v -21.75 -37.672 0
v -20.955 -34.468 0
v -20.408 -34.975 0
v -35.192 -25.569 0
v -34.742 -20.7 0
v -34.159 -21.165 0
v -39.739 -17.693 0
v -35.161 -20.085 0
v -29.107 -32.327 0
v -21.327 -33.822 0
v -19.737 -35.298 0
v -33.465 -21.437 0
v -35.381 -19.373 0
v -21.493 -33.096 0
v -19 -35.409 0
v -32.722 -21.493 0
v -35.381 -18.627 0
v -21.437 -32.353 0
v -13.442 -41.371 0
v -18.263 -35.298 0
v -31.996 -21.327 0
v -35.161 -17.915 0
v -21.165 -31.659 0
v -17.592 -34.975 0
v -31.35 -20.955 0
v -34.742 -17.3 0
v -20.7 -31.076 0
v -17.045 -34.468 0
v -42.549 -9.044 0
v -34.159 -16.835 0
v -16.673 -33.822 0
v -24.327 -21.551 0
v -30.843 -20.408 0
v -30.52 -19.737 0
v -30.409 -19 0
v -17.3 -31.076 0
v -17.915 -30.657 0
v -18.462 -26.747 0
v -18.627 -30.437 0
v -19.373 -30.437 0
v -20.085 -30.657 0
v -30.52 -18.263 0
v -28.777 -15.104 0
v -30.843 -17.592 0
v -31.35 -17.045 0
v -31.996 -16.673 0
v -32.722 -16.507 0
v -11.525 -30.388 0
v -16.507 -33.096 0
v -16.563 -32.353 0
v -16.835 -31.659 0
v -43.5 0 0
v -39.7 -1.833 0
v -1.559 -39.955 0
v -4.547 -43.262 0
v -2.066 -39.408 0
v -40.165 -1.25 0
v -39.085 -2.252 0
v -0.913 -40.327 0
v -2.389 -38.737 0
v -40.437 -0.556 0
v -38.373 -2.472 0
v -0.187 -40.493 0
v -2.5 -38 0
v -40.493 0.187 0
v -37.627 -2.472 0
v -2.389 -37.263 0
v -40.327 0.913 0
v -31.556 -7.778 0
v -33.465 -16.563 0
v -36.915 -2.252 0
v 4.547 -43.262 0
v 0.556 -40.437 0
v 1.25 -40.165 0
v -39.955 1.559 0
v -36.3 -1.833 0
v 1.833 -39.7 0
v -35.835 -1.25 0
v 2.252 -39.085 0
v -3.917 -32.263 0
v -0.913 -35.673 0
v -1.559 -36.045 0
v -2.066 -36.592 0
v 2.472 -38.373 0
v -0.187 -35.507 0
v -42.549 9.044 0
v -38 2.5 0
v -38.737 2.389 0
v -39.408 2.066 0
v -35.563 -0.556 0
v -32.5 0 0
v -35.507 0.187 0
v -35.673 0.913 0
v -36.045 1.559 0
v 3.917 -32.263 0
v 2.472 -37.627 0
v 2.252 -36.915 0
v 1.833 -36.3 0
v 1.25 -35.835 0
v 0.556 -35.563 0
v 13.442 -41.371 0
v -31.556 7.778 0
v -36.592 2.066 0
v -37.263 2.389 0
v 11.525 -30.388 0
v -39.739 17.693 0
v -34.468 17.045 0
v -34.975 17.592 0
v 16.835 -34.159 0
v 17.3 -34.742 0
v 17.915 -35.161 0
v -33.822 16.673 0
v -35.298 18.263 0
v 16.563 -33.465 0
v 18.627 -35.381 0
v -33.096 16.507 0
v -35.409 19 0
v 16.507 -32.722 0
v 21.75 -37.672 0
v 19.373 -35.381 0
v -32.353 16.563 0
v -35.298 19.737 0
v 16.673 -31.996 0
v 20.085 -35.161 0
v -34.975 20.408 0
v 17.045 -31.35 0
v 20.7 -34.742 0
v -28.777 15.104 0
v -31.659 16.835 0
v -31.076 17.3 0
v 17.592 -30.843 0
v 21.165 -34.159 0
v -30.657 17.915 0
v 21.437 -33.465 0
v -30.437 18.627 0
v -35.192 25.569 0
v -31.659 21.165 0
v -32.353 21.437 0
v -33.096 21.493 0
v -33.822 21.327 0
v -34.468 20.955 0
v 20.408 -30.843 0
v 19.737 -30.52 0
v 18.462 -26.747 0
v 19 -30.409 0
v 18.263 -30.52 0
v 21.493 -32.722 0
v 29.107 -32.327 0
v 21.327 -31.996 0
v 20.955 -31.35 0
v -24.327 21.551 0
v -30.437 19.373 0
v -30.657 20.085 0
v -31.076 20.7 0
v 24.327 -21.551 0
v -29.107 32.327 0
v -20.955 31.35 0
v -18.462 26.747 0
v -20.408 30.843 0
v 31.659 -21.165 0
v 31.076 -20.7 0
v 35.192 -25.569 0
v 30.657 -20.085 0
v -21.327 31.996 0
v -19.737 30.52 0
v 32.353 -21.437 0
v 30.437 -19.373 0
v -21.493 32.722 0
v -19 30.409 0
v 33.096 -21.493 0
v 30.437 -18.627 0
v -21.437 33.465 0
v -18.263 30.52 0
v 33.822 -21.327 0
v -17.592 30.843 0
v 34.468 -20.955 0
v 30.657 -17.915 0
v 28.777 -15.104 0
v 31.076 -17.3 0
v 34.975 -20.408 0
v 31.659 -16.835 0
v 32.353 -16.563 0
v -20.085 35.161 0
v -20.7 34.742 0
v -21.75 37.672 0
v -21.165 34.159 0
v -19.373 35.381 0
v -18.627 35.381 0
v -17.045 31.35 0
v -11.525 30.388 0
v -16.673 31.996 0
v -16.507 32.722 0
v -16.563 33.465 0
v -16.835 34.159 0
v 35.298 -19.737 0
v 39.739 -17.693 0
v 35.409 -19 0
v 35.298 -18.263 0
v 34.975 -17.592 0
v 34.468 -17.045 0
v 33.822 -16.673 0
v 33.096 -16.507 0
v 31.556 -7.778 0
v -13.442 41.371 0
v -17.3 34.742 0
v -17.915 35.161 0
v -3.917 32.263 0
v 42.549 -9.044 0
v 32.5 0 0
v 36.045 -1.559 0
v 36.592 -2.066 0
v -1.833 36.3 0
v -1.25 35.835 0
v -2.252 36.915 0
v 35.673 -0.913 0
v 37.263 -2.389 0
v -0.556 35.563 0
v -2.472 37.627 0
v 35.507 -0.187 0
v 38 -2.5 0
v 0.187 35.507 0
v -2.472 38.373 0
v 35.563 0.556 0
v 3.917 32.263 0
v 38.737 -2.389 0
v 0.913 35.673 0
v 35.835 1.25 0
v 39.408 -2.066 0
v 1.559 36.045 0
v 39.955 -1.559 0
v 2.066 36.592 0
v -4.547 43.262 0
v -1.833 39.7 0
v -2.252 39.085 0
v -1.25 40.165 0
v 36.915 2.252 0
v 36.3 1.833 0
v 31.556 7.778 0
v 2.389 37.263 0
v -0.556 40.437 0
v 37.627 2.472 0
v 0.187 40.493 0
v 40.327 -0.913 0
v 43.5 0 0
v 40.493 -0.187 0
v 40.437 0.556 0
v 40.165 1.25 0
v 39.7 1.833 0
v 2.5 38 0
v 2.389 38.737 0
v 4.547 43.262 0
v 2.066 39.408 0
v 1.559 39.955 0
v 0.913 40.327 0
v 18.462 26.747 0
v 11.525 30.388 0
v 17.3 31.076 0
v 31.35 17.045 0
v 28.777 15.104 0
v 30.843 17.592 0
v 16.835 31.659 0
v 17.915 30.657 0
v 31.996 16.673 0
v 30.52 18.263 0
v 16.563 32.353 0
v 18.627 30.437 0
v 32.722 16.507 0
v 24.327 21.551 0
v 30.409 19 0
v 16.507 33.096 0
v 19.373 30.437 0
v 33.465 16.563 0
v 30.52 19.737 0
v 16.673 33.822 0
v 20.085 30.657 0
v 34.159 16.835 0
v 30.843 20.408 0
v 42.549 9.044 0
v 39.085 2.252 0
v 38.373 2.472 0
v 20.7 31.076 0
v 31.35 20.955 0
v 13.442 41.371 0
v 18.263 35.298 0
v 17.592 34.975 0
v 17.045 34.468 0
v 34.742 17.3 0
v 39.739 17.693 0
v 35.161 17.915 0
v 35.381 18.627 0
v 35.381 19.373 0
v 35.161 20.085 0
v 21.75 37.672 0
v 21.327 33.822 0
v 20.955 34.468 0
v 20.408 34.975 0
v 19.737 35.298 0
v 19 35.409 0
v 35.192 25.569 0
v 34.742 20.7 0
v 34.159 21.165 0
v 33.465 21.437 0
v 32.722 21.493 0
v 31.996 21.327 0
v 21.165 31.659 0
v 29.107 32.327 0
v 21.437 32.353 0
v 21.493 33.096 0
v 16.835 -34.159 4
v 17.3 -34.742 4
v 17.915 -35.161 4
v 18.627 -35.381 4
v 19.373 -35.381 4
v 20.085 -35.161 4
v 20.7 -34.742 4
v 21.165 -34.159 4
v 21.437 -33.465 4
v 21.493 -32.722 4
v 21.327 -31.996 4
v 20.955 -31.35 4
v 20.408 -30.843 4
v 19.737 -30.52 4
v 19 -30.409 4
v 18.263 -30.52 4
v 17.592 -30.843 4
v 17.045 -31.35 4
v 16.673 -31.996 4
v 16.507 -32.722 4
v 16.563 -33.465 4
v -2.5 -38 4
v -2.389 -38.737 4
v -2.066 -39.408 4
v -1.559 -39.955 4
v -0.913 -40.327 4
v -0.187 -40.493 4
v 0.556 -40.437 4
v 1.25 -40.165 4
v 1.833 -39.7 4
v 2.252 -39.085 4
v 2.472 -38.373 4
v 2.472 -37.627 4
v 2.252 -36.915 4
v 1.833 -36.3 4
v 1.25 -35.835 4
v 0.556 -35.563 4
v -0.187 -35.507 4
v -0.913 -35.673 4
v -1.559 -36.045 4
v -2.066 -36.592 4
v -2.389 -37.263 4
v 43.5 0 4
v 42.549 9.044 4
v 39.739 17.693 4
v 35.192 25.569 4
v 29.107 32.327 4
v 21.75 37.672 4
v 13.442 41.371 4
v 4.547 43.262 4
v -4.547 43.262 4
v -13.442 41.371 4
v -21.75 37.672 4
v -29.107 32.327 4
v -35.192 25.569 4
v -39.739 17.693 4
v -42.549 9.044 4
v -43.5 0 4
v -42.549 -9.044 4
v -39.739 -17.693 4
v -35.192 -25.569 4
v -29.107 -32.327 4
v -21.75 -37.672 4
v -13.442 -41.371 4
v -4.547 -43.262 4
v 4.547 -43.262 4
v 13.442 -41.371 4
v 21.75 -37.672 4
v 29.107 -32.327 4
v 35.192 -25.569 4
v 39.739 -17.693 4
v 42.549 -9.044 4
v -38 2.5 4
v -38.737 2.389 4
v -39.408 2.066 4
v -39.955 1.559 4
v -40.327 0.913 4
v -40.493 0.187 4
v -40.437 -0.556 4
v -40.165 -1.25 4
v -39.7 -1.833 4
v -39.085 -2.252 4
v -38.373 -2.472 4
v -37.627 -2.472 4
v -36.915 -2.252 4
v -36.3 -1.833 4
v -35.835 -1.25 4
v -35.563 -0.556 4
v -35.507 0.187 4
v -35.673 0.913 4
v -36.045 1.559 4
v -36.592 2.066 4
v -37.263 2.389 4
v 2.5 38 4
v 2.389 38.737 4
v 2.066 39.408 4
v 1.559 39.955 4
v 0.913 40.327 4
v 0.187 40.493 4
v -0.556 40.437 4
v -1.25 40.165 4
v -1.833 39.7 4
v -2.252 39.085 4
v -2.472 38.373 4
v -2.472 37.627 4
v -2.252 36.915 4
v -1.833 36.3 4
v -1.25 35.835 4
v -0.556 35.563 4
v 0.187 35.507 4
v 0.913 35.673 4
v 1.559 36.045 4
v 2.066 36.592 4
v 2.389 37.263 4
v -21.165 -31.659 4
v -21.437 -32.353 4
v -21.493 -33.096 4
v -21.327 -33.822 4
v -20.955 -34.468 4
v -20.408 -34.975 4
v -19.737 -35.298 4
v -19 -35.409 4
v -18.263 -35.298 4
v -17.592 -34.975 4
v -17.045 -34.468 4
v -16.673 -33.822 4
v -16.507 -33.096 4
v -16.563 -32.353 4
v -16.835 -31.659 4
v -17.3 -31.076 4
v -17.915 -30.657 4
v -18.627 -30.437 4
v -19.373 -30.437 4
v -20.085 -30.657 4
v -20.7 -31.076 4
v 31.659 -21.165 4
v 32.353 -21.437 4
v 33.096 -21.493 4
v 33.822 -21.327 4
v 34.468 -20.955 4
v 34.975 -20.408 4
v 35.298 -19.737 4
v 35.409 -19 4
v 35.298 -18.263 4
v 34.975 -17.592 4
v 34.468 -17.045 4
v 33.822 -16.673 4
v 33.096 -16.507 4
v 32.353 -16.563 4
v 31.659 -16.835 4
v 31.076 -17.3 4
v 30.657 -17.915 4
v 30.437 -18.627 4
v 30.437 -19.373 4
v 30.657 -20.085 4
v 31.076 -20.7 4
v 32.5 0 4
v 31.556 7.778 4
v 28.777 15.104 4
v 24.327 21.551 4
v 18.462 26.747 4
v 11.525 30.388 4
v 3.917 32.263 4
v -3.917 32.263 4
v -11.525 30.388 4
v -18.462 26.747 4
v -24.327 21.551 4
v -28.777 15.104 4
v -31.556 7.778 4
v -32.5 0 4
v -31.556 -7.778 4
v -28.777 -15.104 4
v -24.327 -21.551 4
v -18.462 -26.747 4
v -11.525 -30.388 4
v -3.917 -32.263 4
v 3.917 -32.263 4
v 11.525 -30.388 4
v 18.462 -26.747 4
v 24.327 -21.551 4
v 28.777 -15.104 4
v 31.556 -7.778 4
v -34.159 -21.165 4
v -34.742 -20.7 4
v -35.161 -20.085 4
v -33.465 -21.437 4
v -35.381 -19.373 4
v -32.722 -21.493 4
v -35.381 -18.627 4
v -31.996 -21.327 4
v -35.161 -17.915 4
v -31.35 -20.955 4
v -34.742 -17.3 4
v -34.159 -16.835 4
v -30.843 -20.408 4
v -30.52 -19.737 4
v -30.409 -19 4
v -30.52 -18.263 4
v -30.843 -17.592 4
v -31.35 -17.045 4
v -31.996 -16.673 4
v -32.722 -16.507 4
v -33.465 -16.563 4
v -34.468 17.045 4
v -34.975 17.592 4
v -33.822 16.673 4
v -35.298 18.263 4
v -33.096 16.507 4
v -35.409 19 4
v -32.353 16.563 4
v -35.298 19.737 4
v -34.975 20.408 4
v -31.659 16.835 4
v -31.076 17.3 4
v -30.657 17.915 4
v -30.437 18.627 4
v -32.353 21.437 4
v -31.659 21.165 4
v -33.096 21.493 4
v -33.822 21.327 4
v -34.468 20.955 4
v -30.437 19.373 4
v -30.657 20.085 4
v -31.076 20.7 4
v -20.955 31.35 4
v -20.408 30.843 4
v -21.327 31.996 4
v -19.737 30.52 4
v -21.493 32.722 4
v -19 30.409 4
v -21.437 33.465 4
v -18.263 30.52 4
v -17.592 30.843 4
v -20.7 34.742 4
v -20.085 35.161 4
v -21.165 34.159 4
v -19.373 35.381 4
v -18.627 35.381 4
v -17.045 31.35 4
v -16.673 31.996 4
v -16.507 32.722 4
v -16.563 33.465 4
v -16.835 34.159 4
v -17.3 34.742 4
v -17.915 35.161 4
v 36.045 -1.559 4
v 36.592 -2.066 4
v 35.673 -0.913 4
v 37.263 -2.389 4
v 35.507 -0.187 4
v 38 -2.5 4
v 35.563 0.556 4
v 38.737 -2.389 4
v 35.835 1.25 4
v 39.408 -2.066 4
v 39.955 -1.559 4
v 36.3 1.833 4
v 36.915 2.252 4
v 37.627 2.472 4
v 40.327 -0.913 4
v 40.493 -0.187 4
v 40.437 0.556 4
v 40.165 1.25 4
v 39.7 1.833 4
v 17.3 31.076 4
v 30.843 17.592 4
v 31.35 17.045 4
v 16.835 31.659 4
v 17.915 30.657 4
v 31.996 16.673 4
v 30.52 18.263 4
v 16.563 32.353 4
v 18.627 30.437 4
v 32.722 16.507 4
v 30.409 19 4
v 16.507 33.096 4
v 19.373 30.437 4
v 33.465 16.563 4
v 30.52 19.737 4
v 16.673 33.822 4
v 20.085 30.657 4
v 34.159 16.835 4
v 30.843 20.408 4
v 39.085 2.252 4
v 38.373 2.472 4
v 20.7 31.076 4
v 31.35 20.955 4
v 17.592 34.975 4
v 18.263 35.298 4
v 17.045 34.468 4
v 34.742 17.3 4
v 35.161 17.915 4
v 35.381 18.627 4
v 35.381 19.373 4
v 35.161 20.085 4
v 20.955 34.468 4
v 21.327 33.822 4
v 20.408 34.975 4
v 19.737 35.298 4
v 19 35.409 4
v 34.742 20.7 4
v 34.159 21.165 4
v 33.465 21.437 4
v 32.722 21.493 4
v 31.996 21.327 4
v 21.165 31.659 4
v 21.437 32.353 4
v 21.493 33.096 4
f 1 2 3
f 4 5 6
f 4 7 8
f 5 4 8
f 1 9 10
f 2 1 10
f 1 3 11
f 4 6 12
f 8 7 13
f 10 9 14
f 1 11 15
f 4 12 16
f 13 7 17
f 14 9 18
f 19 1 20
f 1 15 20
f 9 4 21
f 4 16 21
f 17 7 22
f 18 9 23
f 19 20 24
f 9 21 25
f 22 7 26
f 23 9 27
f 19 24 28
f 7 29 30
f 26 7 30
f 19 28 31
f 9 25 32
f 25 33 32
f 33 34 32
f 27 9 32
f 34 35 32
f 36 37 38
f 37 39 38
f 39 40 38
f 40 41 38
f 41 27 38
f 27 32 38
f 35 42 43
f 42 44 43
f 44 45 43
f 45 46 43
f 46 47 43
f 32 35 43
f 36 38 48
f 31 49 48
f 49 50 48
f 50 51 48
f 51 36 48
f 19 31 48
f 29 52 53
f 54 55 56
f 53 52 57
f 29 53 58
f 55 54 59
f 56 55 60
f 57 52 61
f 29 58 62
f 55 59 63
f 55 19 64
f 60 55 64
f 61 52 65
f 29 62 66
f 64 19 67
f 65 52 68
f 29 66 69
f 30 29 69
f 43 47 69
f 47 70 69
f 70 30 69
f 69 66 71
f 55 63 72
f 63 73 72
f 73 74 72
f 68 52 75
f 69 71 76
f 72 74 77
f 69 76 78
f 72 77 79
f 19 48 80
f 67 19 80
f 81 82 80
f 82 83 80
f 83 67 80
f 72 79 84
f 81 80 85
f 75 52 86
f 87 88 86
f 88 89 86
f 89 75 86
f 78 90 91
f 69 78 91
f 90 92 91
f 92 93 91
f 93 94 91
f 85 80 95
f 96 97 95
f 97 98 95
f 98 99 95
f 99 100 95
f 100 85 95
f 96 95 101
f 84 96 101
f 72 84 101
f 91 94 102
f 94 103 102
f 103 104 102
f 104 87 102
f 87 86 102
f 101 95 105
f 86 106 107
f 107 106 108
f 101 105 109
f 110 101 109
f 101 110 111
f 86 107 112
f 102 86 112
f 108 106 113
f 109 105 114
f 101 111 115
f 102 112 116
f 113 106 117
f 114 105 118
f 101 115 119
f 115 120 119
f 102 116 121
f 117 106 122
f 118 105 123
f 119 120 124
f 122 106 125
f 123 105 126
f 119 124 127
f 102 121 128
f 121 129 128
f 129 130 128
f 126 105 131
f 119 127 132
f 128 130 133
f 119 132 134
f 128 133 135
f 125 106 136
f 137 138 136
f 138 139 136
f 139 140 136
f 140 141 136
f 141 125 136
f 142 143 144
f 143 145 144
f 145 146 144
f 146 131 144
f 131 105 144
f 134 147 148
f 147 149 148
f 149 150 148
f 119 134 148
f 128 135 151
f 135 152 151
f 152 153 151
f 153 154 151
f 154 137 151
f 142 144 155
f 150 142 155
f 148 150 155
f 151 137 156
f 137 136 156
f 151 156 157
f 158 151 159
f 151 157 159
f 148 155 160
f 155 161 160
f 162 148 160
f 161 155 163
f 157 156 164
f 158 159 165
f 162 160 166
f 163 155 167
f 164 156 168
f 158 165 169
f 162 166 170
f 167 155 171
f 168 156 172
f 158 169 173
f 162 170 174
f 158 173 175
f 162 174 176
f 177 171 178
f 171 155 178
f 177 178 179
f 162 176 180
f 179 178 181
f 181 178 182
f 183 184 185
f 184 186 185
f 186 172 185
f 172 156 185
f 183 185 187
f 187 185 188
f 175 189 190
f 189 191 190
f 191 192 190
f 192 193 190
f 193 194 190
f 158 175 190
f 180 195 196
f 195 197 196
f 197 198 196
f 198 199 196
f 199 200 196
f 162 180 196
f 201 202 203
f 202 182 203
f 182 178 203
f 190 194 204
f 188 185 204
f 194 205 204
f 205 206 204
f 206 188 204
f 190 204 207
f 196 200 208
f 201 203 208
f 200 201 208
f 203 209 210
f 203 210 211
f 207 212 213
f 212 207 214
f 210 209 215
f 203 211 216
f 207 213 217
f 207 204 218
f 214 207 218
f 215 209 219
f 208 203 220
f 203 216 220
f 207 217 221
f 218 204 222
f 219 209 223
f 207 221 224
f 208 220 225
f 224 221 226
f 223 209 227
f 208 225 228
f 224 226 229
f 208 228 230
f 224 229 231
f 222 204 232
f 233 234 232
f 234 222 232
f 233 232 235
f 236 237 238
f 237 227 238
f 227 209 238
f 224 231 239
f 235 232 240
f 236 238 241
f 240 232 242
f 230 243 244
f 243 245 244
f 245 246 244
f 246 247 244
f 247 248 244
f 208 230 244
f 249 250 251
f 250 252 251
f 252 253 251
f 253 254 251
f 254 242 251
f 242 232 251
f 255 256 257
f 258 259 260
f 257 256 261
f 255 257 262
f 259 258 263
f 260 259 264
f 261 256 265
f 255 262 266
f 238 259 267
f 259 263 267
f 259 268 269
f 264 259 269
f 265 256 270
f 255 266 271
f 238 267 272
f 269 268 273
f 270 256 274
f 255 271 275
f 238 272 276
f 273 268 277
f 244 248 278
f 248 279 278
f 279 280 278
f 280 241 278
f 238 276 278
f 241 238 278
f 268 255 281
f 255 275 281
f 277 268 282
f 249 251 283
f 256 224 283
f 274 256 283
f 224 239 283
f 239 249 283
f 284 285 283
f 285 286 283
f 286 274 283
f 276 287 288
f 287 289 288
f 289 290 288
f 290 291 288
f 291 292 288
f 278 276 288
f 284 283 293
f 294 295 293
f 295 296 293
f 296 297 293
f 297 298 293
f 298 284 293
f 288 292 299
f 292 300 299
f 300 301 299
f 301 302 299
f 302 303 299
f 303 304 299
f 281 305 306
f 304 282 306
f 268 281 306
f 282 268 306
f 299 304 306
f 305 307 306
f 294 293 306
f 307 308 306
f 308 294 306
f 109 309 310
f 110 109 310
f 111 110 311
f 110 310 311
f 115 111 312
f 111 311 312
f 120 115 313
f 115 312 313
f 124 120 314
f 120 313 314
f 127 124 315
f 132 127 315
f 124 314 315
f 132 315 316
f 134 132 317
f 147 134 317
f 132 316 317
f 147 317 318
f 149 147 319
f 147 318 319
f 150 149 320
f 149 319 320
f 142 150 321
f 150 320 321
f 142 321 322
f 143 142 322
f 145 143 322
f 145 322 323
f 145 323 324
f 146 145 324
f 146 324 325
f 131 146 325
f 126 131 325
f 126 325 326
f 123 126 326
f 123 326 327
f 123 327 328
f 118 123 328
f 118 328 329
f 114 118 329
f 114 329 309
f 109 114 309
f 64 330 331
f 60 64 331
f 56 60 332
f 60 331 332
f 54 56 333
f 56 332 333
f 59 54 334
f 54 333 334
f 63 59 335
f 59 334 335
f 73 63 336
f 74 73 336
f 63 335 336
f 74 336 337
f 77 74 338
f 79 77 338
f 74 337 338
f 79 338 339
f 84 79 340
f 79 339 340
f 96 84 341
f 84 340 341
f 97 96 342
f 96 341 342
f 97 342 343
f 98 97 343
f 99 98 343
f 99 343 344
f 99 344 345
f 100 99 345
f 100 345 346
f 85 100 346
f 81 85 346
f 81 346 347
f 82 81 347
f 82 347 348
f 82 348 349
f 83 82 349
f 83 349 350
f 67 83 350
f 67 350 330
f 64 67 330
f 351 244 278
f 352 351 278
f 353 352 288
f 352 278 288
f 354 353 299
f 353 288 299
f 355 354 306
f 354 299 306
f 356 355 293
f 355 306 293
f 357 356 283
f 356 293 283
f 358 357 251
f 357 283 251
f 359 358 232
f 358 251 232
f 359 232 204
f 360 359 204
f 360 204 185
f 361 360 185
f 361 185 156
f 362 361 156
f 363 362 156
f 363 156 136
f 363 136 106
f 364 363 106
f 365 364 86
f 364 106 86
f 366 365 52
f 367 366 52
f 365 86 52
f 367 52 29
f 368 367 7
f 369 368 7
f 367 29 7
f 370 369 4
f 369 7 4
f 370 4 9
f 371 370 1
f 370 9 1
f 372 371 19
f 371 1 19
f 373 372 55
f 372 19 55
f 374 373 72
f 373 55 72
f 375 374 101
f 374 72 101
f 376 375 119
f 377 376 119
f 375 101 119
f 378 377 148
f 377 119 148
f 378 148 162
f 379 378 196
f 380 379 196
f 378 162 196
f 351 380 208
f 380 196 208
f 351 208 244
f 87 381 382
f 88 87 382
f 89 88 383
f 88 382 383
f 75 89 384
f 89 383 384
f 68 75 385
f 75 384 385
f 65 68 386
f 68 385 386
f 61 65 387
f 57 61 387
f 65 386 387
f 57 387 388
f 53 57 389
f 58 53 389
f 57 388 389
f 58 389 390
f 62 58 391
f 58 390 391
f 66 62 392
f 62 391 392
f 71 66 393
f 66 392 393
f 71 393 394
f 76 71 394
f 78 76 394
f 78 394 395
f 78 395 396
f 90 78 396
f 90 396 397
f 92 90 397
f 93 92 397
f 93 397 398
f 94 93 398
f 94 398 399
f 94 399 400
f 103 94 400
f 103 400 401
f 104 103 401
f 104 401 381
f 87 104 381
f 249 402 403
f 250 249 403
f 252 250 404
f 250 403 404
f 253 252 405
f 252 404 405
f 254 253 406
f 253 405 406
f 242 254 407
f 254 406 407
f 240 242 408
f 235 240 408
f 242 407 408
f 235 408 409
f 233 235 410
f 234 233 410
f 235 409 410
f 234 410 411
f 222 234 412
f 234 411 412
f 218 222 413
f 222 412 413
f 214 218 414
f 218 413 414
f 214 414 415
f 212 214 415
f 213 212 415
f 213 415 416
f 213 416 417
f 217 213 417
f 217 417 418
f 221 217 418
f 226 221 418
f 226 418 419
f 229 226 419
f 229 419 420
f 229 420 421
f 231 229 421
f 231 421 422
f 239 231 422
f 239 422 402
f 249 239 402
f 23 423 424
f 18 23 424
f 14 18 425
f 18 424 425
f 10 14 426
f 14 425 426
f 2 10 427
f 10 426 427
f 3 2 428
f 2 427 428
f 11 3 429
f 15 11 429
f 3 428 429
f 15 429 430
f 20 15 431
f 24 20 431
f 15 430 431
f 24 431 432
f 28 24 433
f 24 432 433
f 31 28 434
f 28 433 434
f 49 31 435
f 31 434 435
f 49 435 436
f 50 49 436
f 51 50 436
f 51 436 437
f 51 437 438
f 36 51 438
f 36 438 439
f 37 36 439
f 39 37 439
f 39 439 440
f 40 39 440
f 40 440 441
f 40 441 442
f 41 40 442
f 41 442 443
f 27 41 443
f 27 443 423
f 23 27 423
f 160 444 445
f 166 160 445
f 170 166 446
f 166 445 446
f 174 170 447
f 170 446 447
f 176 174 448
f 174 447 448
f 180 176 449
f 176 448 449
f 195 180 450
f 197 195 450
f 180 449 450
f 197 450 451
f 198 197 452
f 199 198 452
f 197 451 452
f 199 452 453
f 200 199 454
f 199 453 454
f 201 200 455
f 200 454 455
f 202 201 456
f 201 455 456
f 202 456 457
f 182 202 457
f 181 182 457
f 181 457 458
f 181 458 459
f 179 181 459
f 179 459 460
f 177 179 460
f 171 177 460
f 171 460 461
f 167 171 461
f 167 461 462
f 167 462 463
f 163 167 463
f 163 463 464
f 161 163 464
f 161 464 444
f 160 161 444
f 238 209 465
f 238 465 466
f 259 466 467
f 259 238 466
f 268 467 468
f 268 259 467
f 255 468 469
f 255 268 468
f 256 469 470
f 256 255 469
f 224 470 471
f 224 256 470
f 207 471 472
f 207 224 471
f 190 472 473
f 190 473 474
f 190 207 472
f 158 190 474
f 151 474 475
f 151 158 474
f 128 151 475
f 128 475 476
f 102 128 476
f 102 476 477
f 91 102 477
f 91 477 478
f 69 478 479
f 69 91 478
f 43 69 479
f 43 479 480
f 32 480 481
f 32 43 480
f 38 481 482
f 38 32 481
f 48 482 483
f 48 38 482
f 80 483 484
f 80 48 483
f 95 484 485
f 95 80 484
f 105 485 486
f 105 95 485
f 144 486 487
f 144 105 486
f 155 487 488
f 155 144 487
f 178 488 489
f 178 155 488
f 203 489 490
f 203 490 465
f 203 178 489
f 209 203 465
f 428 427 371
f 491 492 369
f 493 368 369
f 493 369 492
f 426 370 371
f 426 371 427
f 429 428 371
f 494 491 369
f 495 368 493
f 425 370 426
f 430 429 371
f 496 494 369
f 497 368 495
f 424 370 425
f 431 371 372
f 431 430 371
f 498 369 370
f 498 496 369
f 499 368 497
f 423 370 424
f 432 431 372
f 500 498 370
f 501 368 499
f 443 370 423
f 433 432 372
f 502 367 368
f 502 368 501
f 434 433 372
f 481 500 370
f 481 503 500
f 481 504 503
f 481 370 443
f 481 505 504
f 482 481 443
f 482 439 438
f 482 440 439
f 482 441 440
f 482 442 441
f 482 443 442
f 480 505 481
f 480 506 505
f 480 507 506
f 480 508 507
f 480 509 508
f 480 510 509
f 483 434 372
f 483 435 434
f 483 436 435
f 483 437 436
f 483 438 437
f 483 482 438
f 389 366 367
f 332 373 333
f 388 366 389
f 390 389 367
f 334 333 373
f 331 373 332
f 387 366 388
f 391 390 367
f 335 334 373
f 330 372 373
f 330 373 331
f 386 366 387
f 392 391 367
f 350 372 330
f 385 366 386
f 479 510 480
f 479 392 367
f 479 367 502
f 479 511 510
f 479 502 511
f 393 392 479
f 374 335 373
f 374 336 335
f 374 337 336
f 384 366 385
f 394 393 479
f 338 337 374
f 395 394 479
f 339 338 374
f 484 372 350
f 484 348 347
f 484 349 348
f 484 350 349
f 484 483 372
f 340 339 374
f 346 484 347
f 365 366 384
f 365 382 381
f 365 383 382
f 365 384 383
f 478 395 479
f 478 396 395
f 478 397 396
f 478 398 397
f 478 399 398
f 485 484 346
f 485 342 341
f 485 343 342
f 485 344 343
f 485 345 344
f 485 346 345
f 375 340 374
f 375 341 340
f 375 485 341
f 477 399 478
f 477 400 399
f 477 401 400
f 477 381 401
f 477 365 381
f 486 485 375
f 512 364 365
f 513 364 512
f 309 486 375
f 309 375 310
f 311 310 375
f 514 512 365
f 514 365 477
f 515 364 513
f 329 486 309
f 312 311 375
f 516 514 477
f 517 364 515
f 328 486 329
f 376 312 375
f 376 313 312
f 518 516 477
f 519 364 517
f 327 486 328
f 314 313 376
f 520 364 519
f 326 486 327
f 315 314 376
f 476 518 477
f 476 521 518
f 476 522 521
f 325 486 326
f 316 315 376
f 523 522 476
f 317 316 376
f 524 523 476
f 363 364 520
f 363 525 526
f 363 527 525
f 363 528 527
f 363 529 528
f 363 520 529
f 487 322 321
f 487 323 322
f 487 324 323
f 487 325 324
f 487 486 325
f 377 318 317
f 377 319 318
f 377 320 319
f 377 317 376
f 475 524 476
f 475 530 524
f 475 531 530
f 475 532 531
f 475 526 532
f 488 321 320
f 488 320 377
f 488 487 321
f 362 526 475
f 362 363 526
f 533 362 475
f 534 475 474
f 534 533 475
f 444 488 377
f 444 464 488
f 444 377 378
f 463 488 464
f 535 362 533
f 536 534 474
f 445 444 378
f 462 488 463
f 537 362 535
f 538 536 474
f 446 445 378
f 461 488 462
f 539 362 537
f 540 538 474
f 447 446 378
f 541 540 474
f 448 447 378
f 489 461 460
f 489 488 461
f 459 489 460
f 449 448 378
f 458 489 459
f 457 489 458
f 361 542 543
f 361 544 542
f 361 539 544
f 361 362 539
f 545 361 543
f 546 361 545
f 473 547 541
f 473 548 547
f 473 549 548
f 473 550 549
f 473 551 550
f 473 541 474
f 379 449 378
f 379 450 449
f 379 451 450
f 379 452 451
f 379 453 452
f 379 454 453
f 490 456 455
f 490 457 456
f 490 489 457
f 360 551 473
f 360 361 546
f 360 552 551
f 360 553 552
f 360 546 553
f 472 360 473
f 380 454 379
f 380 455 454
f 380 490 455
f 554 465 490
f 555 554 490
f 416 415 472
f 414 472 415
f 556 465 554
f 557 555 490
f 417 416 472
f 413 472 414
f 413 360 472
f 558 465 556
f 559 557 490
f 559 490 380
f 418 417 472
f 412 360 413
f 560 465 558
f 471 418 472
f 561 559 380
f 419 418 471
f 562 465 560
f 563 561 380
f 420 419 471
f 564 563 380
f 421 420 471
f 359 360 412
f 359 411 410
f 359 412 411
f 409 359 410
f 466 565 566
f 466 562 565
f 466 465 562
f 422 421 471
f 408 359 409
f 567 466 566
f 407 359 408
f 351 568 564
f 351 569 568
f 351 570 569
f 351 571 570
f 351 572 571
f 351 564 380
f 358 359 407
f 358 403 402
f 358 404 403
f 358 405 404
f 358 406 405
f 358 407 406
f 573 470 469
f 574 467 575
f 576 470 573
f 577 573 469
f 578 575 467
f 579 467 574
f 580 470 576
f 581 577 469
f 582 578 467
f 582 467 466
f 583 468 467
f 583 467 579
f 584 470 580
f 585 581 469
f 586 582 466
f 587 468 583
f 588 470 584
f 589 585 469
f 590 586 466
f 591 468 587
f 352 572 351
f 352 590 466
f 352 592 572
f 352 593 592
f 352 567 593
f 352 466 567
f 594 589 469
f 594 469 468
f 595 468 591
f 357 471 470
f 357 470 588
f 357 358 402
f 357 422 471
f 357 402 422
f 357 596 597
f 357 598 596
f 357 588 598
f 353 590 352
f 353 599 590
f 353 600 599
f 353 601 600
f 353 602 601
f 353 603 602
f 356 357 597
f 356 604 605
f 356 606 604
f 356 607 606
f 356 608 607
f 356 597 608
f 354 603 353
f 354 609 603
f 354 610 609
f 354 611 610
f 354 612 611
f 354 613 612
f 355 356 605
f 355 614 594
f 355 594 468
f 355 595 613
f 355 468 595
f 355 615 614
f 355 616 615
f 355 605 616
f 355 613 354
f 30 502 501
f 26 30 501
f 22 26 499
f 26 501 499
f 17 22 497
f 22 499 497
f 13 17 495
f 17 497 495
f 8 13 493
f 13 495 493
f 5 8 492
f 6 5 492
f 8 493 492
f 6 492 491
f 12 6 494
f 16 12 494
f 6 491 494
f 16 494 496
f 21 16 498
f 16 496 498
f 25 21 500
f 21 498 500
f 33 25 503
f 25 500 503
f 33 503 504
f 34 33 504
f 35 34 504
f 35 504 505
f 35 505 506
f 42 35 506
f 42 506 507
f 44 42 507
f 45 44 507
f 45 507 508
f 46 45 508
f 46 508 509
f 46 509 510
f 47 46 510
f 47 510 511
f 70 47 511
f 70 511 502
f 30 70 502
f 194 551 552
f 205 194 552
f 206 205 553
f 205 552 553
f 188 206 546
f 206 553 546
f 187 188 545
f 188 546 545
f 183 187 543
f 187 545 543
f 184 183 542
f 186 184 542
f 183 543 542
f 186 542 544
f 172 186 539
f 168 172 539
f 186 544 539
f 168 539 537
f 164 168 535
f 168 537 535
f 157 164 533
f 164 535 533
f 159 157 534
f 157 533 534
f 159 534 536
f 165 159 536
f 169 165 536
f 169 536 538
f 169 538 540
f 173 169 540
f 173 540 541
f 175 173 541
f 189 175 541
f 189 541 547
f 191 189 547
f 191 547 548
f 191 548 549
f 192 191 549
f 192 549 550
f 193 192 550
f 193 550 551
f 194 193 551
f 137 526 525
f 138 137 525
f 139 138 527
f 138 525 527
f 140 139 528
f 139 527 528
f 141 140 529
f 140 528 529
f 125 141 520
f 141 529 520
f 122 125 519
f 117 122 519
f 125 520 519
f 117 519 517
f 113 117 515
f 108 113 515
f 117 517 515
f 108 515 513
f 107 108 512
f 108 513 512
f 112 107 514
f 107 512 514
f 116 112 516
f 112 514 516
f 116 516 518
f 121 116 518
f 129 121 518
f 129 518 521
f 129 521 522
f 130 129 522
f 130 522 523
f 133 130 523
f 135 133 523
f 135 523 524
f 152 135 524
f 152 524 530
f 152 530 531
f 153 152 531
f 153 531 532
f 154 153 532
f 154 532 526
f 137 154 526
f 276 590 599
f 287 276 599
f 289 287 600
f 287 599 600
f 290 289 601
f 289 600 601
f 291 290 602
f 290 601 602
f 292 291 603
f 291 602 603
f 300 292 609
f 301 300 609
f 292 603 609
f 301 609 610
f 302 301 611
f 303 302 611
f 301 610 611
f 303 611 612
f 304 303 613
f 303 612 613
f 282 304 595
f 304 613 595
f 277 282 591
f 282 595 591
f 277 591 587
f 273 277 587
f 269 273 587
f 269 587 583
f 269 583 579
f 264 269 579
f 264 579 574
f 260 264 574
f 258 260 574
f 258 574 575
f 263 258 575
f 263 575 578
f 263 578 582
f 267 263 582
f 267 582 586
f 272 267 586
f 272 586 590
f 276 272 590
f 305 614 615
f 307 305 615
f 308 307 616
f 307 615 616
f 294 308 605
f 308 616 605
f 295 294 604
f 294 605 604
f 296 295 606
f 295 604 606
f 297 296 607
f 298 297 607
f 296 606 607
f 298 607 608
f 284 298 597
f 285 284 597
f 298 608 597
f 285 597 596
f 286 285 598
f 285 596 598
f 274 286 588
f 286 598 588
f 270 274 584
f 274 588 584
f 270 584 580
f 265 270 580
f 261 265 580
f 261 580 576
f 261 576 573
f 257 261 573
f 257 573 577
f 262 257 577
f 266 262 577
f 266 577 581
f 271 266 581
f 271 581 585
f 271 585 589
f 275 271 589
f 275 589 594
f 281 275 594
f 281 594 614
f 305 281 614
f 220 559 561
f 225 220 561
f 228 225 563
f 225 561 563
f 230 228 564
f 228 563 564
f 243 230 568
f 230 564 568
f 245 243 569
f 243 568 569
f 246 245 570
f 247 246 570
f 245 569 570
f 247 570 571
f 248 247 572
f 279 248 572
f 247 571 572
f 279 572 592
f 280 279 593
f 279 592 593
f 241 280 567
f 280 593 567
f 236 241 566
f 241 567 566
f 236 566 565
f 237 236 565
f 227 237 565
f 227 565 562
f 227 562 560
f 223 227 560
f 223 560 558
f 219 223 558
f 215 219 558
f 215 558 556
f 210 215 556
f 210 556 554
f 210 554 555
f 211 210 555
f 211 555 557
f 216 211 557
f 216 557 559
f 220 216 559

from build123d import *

# Parameters (mm, degrees)
SKETCH1_R          = 43.5
SKETCH1_R_2        = 32.5
BODY_DEPTH         = 4
SKETCH2_R          = 2.5
BOLT_HOLE_DEPTH    = 62.648195432
BOLT_PATTERN_COUNT = 12


with BuildPart() as part:
    # Sketch1 → Body (new body)
    with BuildSketch(Plane.XY):
        Circle(SKETCH1_R)
        Circle(SKETCH1_R_2, mode=Mode.SUBTRACT)
    extrude(amount=BODY_DEPTH)

    # Sketch2 → Bolt Hole (cut, through all)
    with BuildSketch(Plane.XY.offset(4)):
        with Locations((0, 38)):
            Circle(SKETCH2_R)
    bolt_hole = extrude(amount=-BOLT_HOLE_DEPTH, mode=Mode.SUBTRACT)

    # Bolt Pattern: Bolt Hole ×12 about axis
    bolt_pattern_axis = Axis((0, 0, 0), (0, 0, 1))
    for i in range(1, BOLT_PATTERN_COUNT):
        add(bolt_hole.rotate(bolt_pattern_axis, i * 360 / BOLT_PATTERN_COUNT), mode=Mode.SUBTRACT)


solid = part.part
